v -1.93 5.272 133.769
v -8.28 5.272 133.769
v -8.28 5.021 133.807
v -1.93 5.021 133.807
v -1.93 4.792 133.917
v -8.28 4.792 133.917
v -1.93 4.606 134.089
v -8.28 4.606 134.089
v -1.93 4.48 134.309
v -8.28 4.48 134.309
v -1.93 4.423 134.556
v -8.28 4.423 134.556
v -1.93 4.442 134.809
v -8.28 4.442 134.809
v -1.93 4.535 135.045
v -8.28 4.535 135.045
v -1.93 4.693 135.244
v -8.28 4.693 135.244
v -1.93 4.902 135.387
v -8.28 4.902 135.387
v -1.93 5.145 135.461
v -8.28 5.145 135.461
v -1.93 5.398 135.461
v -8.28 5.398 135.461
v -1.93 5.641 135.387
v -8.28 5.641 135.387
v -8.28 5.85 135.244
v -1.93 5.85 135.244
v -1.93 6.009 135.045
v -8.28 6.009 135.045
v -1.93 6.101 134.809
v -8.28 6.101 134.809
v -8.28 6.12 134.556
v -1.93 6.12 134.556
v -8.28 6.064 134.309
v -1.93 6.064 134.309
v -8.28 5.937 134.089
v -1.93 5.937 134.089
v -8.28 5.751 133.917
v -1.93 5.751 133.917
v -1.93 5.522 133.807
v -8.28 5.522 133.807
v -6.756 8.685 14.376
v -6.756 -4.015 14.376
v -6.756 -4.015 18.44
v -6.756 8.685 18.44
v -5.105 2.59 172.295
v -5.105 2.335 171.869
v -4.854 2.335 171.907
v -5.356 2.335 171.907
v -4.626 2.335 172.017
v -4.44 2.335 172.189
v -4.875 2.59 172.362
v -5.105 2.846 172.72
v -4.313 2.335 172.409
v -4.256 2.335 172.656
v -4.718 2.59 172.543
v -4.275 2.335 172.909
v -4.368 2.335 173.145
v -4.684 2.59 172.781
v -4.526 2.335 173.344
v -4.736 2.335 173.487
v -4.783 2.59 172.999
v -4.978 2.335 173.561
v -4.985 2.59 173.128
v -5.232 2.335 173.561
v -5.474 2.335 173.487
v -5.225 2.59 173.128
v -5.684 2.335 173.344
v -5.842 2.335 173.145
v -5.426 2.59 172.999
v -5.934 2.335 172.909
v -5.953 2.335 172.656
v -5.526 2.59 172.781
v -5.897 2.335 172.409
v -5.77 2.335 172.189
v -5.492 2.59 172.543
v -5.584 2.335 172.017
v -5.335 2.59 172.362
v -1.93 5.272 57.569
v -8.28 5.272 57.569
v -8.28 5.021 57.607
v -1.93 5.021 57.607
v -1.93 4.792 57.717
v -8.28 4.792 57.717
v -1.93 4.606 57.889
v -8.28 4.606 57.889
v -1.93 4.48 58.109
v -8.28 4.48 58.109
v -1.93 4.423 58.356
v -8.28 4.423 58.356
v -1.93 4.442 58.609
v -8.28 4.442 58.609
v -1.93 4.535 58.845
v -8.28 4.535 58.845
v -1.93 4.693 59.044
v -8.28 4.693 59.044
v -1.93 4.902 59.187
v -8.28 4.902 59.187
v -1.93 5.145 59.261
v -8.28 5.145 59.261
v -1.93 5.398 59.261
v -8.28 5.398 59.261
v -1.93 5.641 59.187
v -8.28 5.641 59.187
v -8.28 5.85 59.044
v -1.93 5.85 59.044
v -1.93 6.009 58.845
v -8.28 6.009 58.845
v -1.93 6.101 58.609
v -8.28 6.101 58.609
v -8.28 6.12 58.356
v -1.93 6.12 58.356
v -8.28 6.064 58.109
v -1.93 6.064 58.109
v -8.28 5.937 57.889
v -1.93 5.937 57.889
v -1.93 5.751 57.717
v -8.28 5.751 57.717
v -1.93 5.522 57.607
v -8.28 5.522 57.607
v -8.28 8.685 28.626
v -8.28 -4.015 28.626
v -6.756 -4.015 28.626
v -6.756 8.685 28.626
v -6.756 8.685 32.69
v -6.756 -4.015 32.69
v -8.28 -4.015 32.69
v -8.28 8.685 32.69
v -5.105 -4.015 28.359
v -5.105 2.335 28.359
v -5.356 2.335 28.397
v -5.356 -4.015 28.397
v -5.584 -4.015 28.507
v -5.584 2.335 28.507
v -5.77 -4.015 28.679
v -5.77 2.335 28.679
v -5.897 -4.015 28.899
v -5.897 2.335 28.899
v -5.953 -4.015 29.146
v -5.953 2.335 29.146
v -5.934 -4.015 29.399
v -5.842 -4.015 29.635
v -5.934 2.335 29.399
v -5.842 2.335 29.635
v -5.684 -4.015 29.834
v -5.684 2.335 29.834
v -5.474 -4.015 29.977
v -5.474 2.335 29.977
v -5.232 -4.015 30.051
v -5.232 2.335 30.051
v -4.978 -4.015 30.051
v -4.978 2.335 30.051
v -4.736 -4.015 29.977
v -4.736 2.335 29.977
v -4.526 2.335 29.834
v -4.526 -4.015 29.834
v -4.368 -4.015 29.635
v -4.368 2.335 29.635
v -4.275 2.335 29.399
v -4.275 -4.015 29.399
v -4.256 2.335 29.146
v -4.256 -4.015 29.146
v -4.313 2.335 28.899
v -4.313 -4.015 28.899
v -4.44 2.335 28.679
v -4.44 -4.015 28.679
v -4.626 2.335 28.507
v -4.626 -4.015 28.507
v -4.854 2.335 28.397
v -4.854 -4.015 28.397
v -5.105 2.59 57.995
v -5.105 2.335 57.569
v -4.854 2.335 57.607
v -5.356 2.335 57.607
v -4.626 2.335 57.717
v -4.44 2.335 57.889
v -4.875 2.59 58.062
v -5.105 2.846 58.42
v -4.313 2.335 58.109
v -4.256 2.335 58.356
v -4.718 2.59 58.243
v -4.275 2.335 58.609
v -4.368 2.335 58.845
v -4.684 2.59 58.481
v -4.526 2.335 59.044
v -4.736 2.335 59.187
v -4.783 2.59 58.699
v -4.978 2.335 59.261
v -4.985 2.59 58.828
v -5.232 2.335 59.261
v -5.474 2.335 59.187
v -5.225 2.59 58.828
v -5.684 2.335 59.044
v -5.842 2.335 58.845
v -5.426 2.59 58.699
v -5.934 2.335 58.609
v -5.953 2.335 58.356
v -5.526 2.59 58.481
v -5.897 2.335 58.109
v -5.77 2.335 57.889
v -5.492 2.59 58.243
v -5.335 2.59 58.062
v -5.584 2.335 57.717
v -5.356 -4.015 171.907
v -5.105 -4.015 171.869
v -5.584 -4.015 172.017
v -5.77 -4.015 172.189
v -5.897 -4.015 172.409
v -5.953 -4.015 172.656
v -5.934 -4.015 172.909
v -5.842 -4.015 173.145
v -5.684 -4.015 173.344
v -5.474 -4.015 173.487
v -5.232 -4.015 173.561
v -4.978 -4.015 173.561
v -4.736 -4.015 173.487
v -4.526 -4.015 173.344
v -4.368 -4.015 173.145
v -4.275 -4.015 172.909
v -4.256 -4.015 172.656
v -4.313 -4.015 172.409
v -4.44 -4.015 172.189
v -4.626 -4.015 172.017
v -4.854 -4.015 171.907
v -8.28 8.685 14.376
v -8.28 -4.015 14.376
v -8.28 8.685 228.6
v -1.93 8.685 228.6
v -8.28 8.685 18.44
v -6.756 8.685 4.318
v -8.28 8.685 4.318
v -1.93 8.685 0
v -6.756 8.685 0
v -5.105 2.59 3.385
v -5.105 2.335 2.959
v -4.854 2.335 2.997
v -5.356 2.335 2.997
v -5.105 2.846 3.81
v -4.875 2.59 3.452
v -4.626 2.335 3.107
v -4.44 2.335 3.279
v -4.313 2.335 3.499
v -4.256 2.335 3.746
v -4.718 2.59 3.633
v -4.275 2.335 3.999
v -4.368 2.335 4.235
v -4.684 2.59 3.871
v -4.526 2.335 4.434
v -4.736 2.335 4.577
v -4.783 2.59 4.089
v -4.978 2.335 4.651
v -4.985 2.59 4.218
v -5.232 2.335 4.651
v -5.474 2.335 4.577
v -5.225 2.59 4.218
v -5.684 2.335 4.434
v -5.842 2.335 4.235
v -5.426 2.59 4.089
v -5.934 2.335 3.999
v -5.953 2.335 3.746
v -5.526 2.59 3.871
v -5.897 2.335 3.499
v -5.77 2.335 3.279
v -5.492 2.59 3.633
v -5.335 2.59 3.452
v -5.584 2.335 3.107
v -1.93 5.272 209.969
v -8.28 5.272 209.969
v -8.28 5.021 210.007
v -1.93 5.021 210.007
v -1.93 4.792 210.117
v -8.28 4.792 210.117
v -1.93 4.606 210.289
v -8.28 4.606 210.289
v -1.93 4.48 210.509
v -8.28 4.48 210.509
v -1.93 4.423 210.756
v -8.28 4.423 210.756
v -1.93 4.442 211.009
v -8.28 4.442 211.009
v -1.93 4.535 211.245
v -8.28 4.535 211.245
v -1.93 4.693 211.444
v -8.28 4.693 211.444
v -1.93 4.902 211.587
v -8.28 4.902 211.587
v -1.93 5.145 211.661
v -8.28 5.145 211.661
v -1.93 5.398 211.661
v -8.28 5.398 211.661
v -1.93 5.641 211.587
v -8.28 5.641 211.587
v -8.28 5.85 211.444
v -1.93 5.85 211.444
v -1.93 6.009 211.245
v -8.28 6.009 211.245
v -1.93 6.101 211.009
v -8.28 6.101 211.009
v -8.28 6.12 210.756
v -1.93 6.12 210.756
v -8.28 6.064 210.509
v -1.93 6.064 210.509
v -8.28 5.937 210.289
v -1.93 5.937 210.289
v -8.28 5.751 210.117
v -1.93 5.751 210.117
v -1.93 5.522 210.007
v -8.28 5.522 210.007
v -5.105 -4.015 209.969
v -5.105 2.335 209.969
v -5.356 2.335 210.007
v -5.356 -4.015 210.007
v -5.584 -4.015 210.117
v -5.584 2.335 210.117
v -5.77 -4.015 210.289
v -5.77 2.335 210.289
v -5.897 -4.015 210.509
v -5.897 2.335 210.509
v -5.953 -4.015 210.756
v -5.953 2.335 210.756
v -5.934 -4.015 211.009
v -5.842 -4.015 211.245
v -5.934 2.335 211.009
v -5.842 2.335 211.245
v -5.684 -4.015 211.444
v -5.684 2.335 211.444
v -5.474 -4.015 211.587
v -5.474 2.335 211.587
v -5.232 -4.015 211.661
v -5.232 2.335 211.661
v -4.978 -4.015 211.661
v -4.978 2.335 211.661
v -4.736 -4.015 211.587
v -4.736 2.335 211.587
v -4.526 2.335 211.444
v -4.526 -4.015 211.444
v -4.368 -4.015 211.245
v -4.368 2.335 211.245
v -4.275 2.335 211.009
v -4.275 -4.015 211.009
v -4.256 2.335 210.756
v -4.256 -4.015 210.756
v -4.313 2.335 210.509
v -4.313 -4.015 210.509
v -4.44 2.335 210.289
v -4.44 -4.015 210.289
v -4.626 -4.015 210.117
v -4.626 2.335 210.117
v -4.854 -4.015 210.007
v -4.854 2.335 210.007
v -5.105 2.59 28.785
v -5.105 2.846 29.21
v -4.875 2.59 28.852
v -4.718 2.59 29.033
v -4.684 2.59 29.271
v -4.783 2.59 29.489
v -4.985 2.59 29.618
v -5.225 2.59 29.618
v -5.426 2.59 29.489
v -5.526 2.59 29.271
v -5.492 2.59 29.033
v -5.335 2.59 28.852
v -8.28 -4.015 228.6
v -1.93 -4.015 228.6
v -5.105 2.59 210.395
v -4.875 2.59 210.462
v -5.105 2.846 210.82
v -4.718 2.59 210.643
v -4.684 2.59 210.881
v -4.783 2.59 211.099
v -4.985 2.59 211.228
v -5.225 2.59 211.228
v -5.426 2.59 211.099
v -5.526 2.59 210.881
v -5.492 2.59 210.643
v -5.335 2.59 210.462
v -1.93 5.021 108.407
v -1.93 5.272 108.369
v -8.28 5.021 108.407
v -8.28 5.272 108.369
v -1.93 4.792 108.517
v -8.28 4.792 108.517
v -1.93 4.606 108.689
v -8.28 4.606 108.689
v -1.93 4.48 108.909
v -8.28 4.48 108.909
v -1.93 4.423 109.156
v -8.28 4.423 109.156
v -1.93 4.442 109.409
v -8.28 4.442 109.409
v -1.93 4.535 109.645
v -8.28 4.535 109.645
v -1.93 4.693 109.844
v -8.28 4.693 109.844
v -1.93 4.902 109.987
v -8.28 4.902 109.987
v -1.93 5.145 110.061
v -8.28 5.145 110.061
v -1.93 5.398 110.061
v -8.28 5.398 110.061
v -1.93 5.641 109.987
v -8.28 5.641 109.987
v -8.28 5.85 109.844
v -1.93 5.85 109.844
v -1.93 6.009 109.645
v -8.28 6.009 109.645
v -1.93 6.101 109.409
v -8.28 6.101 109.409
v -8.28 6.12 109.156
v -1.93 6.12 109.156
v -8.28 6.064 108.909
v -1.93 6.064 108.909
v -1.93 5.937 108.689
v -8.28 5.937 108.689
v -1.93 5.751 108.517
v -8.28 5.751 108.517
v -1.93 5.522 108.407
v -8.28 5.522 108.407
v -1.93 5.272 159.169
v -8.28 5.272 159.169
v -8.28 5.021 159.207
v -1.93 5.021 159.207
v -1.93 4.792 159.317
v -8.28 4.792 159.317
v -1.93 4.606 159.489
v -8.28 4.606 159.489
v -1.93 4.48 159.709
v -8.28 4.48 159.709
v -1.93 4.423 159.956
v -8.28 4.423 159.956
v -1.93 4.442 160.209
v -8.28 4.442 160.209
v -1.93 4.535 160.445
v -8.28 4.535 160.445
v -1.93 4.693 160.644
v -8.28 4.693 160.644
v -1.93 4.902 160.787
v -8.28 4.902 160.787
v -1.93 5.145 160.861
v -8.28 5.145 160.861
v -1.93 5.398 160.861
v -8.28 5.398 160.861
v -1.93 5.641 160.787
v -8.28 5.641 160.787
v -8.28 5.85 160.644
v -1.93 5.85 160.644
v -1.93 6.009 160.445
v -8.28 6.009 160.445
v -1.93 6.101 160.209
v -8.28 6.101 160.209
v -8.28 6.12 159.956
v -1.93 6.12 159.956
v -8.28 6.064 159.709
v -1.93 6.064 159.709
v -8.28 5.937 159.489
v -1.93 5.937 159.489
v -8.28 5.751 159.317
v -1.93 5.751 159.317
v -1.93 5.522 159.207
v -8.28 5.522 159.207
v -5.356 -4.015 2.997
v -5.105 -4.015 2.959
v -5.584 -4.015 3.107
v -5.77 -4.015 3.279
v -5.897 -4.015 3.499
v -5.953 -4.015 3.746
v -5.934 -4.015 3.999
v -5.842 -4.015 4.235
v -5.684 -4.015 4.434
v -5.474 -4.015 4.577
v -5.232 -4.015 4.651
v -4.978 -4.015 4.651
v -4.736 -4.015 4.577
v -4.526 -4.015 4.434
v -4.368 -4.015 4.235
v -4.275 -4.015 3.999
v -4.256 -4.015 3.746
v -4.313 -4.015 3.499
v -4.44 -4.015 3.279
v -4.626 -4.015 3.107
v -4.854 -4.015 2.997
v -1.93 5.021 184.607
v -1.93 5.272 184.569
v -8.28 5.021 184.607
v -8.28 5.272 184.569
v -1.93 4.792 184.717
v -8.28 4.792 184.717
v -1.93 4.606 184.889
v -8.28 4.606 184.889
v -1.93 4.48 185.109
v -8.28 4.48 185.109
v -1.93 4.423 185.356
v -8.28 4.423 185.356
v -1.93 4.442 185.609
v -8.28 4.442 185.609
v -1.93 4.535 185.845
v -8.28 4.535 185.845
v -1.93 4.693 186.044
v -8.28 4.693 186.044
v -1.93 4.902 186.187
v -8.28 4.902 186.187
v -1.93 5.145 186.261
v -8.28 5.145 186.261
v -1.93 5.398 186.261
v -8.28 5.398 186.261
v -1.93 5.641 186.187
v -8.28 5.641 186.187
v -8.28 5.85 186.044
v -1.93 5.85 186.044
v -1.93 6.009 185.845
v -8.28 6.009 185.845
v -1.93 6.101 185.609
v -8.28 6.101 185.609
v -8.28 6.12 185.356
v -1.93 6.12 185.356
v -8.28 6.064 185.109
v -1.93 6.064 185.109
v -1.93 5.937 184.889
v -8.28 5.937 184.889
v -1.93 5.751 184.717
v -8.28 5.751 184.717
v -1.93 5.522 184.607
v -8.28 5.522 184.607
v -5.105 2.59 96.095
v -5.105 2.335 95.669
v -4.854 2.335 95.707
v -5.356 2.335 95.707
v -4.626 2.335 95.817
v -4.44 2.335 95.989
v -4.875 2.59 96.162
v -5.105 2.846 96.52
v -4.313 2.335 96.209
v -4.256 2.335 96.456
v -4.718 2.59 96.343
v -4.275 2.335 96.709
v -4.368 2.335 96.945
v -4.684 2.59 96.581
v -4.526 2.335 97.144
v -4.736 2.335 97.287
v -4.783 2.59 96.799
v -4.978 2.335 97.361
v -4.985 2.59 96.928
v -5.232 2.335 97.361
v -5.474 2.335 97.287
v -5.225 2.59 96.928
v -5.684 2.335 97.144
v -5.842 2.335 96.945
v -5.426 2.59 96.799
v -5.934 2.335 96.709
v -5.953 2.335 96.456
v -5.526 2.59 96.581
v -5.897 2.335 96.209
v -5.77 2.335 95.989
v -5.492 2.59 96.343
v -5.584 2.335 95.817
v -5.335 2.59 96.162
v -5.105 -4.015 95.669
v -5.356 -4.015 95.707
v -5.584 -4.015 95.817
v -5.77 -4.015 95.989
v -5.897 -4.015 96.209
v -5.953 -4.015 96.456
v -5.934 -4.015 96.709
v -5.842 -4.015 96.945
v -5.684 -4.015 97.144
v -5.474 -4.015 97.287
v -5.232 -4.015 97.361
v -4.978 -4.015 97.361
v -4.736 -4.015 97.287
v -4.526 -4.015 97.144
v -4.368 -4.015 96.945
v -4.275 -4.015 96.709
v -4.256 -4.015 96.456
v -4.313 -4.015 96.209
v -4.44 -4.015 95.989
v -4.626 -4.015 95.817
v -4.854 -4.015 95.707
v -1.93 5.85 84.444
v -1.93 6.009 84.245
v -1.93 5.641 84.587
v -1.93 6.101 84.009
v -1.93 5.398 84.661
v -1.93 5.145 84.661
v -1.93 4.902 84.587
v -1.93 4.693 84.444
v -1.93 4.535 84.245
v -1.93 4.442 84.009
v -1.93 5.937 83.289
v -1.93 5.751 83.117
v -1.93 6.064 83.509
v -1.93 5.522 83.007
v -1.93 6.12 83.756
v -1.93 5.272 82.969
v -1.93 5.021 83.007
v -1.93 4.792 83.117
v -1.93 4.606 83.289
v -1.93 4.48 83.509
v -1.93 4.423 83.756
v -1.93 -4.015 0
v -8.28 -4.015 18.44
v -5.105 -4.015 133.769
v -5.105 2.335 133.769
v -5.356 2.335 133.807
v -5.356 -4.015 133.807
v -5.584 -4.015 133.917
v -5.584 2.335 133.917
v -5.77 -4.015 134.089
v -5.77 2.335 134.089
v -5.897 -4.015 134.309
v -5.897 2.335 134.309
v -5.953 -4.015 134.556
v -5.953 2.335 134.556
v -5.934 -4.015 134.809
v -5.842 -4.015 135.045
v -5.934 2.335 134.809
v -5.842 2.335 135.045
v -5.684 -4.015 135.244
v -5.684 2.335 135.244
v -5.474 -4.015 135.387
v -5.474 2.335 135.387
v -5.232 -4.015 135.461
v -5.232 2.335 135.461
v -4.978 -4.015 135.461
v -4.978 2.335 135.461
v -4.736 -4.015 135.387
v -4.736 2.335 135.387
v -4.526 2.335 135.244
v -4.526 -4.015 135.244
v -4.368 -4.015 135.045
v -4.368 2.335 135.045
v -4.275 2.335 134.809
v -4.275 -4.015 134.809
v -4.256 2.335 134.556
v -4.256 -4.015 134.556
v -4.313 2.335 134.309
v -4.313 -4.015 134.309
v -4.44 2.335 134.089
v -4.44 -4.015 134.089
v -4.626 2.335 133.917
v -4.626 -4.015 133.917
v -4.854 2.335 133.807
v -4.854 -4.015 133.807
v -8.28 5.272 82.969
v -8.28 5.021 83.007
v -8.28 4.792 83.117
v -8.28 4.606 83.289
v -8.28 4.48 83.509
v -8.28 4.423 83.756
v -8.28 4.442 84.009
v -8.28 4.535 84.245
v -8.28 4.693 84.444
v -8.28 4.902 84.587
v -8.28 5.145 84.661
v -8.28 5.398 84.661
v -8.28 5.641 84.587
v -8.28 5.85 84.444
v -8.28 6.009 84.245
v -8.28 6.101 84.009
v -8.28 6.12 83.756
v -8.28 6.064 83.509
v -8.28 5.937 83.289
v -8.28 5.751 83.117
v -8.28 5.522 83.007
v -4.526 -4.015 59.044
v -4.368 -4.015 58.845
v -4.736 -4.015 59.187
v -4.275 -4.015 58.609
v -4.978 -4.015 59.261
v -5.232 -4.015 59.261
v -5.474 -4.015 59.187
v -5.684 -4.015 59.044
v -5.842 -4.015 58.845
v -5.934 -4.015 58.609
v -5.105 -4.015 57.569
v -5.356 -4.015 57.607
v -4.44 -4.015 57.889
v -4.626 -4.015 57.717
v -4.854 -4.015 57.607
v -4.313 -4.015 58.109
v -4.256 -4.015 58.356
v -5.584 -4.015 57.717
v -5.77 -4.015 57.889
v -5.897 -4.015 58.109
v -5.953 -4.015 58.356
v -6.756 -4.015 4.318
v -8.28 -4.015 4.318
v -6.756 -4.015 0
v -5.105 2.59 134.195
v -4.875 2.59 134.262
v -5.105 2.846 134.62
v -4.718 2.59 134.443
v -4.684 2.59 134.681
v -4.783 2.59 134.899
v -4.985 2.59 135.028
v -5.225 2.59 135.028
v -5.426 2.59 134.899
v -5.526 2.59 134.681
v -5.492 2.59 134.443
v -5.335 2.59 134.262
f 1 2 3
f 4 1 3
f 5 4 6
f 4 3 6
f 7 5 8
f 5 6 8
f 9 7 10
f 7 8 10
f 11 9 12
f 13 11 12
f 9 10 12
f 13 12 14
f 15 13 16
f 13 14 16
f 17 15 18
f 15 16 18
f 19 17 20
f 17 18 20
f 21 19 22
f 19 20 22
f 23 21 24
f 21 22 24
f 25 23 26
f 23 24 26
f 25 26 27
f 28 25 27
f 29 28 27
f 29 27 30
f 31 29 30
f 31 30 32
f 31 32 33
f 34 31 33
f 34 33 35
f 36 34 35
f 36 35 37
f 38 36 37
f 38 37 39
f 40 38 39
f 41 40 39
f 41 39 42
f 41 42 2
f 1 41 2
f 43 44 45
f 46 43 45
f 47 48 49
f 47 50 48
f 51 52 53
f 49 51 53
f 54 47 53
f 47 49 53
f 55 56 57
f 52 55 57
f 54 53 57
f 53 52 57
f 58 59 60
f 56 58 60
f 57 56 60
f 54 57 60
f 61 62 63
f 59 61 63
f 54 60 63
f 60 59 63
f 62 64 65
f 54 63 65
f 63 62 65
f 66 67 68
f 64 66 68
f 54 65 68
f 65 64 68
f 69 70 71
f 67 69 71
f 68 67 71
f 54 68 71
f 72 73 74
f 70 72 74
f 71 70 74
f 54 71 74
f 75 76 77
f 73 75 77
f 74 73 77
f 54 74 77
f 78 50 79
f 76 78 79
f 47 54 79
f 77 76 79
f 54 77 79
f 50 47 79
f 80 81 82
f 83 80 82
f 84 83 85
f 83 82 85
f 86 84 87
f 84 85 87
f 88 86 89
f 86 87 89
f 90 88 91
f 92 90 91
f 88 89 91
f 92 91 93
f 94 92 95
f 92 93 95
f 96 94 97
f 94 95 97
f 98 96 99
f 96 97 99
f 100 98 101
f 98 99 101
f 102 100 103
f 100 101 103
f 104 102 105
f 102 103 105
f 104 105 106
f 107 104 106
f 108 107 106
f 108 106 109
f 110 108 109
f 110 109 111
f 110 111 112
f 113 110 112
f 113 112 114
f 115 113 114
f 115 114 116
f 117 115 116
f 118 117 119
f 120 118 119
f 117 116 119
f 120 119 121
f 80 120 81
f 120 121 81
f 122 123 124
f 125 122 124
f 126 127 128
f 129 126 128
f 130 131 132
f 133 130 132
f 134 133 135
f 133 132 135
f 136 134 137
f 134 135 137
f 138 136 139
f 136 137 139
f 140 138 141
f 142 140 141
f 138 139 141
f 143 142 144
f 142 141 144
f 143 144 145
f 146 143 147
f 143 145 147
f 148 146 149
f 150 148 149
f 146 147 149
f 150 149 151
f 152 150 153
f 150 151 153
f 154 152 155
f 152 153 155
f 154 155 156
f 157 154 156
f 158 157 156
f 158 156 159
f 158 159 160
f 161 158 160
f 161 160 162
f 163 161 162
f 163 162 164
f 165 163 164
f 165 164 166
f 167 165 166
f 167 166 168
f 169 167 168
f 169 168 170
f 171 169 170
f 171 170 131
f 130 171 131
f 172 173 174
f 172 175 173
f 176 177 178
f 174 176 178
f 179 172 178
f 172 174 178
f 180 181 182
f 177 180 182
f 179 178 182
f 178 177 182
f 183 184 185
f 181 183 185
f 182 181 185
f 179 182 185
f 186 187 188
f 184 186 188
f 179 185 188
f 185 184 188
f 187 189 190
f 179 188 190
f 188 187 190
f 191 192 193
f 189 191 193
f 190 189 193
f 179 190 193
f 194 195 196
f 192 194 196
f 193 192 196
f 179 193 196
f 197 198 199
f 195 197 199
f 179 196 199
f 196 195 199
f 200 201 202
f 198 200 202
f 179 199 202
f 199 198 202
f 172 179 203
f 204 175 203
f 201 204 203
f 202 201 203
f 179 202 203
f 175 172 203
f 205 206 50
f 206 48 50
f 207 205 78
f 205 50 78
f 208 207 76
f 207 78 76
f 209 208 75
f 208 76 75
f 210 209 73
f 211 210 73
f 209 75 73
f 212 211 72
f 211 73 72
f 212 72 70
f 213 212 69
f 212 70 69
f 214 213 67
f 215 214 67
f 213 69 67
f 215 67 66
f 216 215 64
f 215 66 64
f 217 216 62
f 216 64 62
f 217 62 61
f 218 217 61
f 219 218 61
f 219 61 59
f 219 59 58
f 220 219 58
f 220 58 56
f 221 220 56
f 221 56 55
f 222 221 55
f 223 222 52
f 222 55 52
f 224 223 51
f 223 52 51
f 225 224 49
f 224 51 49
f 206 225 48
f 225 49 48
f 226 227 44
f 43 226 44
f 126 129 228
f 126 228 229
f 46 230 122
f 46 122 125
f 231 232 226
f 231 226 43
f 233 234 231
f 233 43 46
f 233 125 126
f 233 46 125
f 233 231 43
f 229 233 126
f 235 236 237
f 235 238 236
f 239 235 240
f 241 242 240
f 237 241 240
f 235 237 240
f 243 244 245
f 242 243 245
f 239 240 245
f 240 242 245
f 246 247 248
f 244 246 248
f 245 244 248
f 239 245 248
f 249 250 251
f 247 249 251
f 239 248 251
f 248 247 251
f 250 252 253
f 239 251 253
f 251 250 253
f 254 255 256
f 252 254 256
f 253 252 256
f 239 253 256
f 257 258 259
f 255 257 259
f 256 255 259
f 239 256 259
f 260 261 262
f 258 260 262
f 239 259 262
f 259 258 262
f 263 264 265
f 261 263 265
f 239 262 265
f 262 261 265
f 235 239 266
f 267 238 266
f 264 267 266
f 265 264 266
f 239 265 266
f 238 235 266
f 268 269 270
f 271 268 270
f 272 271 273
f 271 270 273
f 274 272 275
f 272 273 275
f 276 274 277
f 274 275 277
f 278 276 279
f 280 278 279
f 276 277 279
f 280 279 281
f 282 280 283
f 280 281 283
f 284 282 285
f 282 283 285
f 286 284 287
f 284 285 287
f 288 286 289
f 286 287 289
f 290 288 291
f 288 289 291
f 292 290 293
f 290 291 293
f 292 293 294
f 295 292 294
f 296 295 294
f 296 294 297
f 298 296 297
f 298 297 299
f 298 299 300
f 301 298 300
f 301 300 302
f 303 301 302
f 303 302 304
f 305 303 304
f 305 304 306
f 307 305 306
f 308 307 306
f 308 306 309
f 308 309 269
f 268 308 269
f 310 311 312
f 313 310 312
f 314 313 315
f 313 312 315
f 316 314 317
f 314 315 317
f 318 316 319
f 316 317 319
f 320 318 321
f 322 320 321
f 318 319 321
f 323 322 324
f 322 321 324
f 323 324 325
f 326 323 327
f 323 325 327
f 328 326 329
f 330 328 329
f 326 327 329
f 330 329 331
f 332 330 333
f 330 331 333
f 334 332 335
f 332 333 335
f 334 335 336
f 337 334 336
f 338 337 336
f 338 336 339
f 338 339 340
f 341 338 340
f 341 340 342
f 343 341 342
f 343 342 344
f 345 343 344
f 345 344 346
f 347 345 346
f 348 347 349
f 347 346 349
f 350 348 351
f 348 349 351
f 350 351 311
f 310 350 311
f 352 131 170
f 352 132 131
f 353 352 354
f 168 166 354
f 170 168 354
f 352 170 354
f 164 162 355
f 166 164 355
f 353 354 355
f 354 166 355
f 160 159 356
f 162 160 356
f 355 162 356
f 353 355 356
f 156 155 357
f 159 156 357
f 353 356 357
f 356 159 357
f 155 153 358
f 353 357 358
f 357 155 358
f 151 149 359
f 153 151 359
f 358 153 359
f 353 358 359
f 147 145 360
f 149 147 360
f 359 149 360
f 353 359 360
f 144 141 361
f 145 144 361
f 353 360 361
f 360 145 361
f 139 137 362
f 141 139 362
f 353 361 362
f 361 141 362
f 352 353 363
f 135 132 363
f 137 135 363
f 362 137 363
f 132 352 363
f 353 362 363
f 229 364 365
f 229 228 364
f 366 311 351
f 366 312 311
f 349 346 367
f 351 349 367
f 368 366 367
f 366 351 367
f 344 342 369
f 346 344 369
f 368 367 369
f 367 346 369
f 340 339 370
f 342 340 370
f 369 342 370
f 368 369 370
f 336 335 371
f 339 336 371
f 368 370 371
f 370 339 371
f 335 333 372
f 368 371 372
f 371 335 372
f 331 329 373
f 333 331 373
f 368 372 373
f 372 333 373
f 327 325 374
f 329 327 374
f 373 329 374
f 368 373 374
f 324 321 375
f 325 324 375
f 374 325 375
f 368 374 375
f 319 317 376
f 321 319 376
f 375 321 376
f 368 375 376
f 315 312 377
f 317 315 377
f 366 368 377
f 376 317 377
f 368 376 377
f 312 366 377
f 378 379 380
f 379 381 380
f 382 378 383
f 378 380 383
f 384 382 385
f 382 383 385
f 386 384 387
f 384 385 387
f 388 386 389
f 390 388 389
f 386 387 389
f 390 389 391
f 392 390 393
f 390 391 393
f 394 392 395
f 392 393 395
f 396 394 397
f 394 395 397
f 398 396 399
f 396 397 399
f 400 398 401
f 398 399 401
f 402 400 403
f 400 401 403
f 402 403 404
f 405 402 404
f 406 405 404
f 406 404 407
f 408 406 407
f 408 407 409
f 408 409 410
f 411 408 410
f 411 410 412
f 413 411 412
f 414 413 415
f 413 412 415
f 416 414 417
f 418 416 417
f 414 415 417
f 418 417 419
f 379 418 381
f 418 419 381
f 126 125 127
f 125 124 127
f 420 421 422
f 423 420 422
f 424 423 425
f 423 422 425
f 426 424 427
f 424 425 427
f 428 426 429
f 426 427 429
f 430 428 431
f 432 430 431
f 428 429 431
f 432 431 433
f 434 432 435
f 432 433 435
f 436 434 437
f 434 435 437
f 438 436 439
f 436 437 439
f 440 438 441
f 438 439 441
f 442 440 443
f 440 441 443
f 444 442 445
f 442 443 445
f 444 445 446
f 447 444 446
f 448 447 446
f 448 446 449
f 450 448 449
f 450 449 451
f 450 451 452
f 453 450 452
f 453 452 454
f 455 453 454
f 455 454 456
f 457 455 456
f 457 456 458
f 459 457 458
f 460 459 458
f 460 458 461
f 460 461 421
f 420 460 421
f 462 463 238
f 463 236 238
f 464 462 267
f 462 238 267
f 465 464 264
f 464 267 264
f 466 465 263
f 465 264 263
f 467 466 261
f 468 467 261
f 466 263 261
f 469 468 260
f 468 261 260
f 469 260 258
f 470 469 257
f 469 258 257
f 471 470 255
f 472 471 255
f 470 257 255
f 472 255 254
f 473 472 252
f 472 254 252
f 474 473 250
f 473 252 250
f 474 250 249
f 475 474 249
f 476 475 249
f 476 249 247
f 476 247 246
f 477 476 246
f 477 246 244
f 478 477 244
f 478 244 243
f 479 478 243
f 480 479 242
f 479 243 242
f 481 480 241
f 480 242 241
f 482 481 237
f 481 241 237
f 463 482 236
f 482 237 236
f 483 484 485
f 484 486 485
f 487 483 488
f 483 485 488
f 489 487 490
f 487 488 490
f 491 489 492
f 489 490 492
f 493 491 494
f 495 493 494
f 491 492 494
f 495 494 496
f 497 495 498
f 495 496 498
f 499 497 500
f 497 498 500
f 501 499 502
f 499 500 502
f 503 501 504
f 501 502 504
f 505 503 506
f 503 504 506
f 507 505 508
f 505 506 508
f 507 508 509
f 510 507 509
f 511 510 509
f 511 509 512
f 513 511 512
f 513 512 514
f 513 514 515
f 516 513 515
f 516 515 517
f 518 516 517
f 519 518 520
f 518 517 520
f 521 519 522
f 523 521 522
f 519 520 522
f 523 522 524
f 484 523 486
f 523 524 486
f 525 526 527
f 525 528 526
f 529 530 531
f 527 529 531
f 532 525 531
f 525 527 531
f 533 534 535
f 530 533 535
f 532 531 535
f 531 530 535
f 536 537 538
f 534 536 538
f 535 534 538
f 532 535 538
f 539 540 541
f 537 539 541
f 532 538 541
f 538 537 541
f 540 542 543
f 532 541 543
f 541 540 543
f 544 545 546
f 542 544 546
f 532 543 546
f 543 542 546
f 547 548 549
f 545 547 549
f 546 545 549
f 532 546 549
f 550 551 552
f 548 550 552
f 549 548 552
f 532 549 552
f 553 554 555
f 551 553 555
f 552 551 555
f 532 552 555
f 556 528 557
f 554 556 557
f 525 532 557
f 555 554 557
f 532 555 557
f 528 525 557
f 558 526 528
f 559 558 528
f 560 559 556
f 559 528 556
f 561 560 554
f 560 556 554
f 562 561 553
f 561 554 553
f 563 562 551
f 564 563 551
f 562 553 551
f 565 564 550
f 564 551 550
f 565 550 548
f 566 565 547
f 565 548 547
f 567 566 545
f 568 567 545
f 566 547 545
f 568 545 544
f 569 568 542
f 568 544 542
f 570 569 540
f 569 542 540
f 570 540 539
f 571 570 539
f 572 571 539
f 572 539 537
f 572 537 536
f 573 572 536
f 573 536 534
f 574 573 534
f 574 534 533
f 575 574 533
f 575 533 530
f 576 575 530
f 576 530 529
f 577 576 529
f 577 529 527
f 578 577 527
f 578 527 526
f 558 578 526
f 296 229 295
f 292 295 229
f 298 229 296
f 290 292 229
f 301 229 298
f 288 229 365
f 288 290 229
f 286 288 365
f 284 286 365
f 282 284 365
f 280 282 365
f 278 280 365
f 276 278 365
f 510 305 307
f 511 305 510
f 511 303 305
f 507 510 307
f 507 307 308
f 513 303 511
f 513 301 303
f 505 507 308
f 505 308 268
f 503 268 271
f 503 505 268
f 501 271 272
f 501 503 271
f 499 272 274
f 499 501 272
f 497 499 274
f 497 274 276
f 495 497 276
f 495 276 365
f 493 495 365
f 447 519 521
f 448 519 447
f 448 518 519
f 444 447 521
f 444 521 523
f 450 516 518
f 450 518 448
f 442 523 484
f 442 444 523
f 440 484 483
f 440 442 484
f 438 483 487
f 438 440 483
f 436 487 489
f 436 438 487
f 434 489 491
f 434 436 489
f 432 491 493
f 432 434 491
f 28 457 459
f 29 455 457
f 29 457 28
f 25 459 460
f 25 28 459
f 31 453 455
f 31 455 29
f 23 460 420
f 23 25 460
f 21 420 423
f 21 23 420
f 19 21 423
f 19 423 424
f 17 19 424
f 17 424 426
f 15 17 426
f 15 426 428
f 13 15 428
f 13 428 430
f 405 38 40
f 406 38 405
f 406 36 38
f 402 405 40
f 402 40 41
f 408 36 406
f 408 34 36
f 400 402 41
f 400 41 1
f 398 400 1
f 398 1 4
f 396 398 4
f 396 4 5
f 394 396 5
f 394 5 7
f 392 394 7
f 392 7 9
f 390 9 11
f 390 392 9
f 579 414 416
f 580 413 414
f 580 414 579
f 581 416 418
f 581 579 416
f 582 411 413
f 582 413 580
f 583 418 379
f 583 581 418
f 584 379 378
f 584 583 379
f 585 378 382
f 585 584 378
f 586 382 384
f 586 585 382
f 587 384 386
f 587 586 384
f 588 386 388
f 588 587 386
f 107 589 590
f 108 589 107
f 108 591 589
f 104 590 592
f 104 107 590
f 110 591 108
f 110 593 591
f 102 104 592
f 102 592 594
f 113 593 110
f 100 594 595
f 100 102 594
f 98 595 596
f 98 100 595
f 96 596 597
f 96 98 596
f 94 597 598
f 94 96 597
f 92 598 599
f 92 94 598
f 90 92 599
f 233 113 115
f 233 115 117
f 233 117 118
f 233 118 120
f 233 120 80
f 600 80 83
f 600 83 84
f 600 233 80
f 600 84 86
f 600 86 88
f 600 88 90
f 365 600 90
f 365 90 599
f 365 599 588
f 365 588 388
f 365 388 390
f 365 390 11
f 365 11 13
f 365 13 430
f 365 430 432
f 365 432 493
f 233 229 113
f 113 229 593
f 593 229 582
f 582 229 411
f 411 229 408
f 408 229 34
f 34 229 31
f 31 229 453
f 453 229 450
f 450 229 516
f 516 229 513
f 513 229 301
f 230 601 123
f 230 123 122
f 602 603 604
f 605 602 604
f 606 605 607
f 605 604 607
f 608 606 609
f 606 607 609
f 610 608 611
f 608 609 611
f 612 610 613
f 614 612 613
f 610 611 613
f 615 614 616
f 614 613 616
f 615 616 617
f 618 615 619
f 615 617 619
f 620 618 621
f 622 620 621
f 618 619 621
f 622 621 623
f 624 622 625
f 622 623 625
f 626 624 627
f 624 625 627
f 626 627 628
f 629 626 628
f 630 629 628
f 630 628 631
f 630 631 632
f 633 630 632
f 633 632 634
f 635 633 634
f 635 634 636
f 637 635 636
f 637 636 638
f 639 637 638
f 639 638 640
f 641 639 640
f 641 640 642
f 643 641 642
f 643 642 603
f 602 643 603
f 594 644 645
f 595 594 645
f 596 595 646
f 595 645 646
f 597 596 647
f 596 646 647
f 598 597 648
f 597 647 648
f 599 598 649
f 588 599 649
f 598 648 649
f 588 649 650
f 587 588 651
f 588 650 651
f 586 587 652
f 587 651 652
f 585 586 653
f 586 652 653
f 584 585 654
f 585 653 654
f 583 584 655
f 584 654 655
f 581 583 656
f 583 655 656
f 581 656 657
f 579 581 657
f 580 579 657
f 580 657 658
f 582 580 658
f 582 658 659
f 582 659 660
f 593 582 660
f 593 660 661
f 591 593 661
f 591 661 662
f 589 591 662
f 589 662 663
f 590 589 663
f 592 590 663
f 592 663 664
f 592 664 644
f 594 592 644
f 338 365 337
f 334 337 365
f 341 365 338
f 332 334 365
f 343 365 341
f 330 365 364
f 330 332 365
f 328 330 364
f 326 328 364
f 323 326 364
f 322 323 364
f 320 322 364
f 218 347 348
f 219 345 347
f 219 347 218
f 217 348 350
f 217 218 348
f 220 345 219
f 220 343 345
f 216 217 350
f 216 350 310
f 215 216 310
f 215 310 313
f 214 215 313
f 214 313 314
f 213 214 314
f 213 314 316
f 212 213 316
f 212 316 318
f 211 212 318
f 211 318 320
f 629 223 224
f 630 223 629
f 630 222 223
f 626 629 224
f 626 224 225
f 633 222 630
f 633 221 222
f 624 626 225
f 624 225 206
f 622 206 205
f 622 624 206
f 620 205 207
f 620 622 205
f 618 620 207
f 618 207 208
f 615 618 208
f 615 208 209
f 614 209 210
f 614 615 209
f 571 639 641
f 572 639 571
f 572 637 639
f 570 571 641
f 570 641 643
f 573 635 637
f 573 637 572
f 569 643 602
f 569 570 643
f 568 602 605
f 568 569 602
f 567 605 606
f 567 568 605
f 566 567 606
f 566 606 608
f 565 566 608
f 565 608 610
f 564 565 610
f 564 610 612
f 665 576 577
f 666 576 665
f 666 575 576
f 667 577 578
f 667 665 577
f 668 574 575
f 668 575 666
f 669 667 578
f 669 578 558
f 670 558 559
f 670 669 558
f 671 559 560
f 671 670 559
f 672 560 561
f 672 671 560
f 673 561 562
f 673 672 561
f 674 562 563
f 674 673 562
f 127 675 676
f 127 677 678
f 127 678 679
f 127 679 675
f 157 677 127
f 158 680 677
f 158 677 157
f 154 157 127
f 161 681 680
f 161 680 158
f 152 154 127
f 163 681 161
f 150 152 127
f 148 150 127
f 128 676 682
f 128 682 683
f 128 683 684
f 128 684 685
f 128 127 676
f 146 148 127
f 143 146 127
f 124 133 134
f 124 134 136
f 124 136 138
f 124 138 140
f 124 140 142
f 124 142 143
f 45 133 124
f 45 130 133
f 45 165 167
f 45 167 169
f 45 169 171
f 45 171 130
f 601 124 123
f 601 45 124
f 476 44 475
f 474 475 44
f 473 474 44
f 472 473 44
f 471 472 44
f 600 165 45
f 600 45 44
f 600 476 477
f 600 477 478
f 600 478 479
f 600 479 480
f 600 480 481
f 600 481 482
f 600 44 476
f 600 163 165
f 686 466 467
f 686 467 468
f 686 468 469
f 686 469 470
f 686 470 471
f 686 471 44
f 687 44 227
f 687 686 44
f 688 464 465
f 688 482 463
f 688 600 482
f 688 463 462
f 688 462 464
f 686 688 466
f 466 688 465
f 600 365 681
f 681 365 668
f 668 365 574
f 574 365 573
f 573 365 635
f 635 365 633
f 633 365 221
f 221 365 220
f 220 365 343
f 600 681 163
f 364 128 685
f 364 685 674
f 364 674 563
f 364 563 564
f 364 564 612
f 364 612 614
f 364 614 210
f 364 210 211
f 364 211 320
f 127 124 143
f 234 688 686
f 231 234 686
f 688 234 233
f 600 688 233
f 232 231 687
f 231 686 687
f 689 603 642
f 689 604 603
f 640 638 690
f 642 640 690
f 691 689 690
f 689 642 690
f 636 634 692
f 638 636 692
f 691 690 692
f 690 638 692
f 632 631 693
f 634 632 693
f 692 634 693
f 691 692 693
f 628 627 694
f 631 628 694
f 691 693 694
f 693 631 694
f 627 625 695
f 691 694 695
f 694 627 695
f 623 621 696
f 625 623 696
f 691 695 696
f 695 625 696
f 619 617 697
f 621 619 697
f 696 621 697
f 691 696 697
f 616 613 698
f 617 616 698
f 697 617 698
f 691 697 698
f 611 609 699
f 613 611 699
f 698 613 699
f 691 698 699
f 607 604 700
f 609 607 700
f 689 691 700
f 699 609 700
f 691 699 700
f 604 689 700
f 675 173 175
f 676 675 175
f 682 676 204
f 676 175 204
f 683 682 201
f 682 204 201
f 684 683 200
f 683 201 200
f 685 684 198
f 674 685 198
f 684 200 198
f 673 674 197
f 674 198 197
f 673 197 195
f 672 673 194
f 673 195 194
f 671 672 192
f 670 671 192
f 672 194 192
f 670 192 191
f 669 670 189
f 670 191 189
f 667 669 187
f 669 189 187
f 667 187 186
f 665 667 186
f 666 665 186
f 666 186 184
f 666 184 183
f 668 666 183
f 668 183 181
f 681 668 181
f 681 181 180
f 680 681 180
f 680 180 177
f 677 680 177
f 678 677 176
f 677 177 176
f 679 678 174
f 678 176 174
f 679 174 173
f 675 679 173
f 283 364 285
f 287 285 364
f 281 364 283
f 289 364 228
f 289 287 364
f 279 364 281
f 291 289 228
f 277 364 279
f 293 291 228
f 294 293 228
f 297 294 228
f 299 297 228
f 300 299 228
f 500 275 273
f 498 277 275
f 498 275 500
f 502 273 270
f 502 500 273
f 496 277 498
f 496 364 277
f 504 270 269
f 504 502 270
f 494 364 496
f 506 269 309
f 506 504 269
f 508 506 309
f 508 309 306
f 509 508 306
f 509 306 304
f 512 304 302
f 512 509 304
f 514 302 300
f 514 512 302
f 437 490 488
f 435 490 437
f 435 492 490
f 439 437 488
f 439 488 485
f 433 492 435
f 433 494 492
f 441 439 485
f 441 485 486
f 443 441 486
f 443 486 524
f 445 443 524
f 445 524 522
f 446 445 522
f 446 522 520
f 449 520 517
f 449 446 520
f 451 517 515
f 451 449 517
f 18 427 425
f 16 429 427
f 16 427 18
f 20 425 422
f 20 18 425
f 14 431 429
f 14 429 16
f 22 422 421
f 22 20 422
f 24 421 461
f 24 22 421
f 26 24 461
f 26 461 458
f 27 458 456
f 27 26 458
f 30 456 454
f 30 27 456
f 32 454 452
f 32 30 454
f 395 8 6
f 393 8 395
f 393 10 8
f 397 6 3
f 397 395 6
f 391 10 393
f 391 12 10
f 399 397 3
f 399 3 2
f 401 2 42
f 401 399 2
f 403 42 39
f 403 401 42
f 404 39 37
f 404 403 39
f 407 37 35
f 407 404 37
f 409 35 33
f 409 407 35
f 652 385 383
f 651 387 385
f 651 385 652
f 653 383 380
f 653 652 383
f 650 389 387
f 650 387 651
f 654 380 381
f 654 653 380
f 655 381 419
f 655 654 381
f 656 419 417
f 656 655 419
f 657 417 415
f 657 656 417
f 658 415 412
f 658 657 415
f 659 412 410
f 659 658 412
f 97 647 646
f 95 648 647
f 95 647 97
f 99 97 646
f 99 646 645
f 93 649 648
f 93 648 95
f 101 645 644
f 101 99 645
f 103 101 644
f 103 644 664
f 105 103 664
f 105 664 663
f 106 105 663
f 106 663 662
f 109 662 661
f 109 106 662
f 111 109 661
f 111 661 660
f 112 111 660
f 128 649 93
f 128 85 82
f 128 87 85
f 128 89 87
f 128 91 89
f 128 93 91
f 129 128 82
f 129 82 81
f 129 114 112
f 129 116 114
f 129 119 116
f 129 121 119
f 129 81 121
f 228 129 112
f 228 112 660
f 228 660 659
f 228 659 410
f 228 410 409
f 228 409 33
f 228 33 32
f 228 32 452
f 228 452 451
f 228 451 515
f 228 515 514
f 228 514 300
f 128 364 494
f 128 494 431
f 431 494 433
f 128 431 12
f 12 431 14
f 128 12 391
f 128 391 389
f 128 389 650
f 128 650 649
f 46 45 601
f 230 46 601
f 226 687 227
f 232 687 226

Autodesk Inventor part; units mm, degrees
ref_plane "YZ Plane" through (0, 0, 0) normal (1, 0, 0) x (0, 1, 0)
ref_plane "XZ Plane" through (0, 0, 0) normal (0, 1, 0) x (-1, 0, 0)
ref_plane "XY Plane" through (0, 0, 0) normal (0, 0, 1) x (1, 0, 0)
sketch "Sketch2" plane through (0, 0, 0) normal (0, 0, 1) x (1, 0, 0)
  line L0 (-8.2799, 8.6846) -> (-1.9299, 8.6846)
  line L1 (-1.9299, 8.6846) -> (-1.9299, -4.0154)
  line L2 (-1.9299, -4.0154) -> (-8.2799, -4.0154)
  line L3 (-8.2799, -4.0154) -> (-8.2799, 8.6846)
  point P0 (0, 0)
  dimension "d3" = 6.35
  dimension "d5" = 12.7
extrude "Extrusion1" add sketch "Sketch2" along normal blind 228.6
sketch "Sketch3" plane through (-1.9299, -4.0154, 0) normal (1, 0, 0) x (0, 0, -1)
  point P0 (-228.6, 12.7)
  point P1 (0, 4.0154)
  point P2 (-210.82, 9.287)
  point P3 (-30.6578, 9.6266)
  dimension "d8" = 3.413
  dimension "d9" = 17.78
  dimension "d45" = 197.9422
  dimension "d46" = 3.0734
hole "Hole1" at (-1.9299, 5.2716, 210.82) direction (-1, 0, 0) diameter 1.7018 end through all
pattern_linear "Rectangular Pattern1" count 7 spacing 25.4 along (0, 0, -1) of "Hole1"
sketch "Sketch6" plane through (203.1751, -4.0154, 104.775) normal (0, -1, 0) x (1, 0, 0)
  point P0 (0, 4.0154)
  point P1 (-208.28, -100.965)
  point P2 (-208.28, -46.355)
  point P3 (-211.455, -104.775)
  point P4 (-205.105, -104.775)
  dimension "d68" = 58.42
  dimension "d69" = 3.81
  dimension "d76" = 3.175
  dimension "d77" = 3.175
hole "Hole2" at (-5.1049, -4.0154, 3.81) direction (0, 1, 0) diameter 1.7018 depth 6.35 tip angle 118
hole "Hole5" at (-5.1049, -4.0154, 58.42) direction (0, 1, 0) diameter 1.7018 depth 6.35 tip angle 118
pattern_linear "Rectangular Pattern5" count 2 spacing 25.4 along (0, 0, 1) of "Hole2"
pattern_linear "Rectangular Pattern6" count 5 spacing 38.1 along (0, 0, 1) of "Hole5"
sketch "Sketch9" plane through (-8.2799, -4.0154, 0) normal (0, -1, 0) x (1, 0, 0)
  line L0 (6.35, 0) -> (6.35, 228.6) projected
  line L1 (0, 0) -> (0, 228.6) projected
  line L2 (6.35, 0) -> (0, 0) projected
  line L3 (0, 0) -> (6.35, 0) projected
  line L4 (6.35, 30.6578) -> (0, 30.6578) construction
  line L5 (6.096, 16.4084) -> (0, 16.4084) construction
  line L6 (0, 0) -> (0, 228.6) construction
  line L7 (6.35, 2.159) -> (0, 2.159) construction
  line L8 (1.524, 32.6898) -> (0, 32.6898)
  line L9 (0, 32.6898) -> (0, 28.6258)
  line L10 (0, 28.6258) -> (1.524, 28.6258)
  line L11 (1.524, 28.6258) -> (1.524, 32.6898)
  line L12 (1.524, 32.6898) -> (0, 28.6258) construction
  line L13 (0, 32.6898) -> (1.524, 28.6258) construction
  line L14 (1.524, 18.4404) -> (0, 18.4404)
  line L15 (0, 18.4404) -> (0, 14.3764)
  line L16 (0, 14.3764) -> (1.524, 14.3764)
  line L17 (1.524, 14.3764) -> (1.524, 18.4404)
  line L18 (1.524, 18.4404) -> (0, 14.3764) construction
  line L19 (0, 18.4404) -> (1.524, 14.3764) construction
  line L20 (1.524, 4.318) -> (0, 4.318)
  line L21 (0, 4.318) -> (0, 0)
  line L22 (0, 0) -> (1.524, 0)
  line L23 (1.524, 0) -> (1.524, 4.318)
  line L24 (1.524, 4.318) -> (0, 0) construction
  line L25 (0, 4.318) -> (1.524, 0) construction
  point P0 (6.35, 4.191)
  point P1 (4.318, 0)
  point P2 (0.762, 30.6578)
  point P3 (0.762, 16.4084)
  point P4 (0.762, 2.159)
  dimension "d78" = 30.6578
  dimension "d93" = 4.064
  dimension "d94" = 1.524
  dimension "d95" = 1.524
  dimension "d96" = 4.064
  dimension "d97" = 1.524
extrude "Extrusion3" cut sketch "Sketch9" against normal through all
properties part number "mounting rail 9.0 x.250 x.500-A-sfpcutouts" material "Gold"
